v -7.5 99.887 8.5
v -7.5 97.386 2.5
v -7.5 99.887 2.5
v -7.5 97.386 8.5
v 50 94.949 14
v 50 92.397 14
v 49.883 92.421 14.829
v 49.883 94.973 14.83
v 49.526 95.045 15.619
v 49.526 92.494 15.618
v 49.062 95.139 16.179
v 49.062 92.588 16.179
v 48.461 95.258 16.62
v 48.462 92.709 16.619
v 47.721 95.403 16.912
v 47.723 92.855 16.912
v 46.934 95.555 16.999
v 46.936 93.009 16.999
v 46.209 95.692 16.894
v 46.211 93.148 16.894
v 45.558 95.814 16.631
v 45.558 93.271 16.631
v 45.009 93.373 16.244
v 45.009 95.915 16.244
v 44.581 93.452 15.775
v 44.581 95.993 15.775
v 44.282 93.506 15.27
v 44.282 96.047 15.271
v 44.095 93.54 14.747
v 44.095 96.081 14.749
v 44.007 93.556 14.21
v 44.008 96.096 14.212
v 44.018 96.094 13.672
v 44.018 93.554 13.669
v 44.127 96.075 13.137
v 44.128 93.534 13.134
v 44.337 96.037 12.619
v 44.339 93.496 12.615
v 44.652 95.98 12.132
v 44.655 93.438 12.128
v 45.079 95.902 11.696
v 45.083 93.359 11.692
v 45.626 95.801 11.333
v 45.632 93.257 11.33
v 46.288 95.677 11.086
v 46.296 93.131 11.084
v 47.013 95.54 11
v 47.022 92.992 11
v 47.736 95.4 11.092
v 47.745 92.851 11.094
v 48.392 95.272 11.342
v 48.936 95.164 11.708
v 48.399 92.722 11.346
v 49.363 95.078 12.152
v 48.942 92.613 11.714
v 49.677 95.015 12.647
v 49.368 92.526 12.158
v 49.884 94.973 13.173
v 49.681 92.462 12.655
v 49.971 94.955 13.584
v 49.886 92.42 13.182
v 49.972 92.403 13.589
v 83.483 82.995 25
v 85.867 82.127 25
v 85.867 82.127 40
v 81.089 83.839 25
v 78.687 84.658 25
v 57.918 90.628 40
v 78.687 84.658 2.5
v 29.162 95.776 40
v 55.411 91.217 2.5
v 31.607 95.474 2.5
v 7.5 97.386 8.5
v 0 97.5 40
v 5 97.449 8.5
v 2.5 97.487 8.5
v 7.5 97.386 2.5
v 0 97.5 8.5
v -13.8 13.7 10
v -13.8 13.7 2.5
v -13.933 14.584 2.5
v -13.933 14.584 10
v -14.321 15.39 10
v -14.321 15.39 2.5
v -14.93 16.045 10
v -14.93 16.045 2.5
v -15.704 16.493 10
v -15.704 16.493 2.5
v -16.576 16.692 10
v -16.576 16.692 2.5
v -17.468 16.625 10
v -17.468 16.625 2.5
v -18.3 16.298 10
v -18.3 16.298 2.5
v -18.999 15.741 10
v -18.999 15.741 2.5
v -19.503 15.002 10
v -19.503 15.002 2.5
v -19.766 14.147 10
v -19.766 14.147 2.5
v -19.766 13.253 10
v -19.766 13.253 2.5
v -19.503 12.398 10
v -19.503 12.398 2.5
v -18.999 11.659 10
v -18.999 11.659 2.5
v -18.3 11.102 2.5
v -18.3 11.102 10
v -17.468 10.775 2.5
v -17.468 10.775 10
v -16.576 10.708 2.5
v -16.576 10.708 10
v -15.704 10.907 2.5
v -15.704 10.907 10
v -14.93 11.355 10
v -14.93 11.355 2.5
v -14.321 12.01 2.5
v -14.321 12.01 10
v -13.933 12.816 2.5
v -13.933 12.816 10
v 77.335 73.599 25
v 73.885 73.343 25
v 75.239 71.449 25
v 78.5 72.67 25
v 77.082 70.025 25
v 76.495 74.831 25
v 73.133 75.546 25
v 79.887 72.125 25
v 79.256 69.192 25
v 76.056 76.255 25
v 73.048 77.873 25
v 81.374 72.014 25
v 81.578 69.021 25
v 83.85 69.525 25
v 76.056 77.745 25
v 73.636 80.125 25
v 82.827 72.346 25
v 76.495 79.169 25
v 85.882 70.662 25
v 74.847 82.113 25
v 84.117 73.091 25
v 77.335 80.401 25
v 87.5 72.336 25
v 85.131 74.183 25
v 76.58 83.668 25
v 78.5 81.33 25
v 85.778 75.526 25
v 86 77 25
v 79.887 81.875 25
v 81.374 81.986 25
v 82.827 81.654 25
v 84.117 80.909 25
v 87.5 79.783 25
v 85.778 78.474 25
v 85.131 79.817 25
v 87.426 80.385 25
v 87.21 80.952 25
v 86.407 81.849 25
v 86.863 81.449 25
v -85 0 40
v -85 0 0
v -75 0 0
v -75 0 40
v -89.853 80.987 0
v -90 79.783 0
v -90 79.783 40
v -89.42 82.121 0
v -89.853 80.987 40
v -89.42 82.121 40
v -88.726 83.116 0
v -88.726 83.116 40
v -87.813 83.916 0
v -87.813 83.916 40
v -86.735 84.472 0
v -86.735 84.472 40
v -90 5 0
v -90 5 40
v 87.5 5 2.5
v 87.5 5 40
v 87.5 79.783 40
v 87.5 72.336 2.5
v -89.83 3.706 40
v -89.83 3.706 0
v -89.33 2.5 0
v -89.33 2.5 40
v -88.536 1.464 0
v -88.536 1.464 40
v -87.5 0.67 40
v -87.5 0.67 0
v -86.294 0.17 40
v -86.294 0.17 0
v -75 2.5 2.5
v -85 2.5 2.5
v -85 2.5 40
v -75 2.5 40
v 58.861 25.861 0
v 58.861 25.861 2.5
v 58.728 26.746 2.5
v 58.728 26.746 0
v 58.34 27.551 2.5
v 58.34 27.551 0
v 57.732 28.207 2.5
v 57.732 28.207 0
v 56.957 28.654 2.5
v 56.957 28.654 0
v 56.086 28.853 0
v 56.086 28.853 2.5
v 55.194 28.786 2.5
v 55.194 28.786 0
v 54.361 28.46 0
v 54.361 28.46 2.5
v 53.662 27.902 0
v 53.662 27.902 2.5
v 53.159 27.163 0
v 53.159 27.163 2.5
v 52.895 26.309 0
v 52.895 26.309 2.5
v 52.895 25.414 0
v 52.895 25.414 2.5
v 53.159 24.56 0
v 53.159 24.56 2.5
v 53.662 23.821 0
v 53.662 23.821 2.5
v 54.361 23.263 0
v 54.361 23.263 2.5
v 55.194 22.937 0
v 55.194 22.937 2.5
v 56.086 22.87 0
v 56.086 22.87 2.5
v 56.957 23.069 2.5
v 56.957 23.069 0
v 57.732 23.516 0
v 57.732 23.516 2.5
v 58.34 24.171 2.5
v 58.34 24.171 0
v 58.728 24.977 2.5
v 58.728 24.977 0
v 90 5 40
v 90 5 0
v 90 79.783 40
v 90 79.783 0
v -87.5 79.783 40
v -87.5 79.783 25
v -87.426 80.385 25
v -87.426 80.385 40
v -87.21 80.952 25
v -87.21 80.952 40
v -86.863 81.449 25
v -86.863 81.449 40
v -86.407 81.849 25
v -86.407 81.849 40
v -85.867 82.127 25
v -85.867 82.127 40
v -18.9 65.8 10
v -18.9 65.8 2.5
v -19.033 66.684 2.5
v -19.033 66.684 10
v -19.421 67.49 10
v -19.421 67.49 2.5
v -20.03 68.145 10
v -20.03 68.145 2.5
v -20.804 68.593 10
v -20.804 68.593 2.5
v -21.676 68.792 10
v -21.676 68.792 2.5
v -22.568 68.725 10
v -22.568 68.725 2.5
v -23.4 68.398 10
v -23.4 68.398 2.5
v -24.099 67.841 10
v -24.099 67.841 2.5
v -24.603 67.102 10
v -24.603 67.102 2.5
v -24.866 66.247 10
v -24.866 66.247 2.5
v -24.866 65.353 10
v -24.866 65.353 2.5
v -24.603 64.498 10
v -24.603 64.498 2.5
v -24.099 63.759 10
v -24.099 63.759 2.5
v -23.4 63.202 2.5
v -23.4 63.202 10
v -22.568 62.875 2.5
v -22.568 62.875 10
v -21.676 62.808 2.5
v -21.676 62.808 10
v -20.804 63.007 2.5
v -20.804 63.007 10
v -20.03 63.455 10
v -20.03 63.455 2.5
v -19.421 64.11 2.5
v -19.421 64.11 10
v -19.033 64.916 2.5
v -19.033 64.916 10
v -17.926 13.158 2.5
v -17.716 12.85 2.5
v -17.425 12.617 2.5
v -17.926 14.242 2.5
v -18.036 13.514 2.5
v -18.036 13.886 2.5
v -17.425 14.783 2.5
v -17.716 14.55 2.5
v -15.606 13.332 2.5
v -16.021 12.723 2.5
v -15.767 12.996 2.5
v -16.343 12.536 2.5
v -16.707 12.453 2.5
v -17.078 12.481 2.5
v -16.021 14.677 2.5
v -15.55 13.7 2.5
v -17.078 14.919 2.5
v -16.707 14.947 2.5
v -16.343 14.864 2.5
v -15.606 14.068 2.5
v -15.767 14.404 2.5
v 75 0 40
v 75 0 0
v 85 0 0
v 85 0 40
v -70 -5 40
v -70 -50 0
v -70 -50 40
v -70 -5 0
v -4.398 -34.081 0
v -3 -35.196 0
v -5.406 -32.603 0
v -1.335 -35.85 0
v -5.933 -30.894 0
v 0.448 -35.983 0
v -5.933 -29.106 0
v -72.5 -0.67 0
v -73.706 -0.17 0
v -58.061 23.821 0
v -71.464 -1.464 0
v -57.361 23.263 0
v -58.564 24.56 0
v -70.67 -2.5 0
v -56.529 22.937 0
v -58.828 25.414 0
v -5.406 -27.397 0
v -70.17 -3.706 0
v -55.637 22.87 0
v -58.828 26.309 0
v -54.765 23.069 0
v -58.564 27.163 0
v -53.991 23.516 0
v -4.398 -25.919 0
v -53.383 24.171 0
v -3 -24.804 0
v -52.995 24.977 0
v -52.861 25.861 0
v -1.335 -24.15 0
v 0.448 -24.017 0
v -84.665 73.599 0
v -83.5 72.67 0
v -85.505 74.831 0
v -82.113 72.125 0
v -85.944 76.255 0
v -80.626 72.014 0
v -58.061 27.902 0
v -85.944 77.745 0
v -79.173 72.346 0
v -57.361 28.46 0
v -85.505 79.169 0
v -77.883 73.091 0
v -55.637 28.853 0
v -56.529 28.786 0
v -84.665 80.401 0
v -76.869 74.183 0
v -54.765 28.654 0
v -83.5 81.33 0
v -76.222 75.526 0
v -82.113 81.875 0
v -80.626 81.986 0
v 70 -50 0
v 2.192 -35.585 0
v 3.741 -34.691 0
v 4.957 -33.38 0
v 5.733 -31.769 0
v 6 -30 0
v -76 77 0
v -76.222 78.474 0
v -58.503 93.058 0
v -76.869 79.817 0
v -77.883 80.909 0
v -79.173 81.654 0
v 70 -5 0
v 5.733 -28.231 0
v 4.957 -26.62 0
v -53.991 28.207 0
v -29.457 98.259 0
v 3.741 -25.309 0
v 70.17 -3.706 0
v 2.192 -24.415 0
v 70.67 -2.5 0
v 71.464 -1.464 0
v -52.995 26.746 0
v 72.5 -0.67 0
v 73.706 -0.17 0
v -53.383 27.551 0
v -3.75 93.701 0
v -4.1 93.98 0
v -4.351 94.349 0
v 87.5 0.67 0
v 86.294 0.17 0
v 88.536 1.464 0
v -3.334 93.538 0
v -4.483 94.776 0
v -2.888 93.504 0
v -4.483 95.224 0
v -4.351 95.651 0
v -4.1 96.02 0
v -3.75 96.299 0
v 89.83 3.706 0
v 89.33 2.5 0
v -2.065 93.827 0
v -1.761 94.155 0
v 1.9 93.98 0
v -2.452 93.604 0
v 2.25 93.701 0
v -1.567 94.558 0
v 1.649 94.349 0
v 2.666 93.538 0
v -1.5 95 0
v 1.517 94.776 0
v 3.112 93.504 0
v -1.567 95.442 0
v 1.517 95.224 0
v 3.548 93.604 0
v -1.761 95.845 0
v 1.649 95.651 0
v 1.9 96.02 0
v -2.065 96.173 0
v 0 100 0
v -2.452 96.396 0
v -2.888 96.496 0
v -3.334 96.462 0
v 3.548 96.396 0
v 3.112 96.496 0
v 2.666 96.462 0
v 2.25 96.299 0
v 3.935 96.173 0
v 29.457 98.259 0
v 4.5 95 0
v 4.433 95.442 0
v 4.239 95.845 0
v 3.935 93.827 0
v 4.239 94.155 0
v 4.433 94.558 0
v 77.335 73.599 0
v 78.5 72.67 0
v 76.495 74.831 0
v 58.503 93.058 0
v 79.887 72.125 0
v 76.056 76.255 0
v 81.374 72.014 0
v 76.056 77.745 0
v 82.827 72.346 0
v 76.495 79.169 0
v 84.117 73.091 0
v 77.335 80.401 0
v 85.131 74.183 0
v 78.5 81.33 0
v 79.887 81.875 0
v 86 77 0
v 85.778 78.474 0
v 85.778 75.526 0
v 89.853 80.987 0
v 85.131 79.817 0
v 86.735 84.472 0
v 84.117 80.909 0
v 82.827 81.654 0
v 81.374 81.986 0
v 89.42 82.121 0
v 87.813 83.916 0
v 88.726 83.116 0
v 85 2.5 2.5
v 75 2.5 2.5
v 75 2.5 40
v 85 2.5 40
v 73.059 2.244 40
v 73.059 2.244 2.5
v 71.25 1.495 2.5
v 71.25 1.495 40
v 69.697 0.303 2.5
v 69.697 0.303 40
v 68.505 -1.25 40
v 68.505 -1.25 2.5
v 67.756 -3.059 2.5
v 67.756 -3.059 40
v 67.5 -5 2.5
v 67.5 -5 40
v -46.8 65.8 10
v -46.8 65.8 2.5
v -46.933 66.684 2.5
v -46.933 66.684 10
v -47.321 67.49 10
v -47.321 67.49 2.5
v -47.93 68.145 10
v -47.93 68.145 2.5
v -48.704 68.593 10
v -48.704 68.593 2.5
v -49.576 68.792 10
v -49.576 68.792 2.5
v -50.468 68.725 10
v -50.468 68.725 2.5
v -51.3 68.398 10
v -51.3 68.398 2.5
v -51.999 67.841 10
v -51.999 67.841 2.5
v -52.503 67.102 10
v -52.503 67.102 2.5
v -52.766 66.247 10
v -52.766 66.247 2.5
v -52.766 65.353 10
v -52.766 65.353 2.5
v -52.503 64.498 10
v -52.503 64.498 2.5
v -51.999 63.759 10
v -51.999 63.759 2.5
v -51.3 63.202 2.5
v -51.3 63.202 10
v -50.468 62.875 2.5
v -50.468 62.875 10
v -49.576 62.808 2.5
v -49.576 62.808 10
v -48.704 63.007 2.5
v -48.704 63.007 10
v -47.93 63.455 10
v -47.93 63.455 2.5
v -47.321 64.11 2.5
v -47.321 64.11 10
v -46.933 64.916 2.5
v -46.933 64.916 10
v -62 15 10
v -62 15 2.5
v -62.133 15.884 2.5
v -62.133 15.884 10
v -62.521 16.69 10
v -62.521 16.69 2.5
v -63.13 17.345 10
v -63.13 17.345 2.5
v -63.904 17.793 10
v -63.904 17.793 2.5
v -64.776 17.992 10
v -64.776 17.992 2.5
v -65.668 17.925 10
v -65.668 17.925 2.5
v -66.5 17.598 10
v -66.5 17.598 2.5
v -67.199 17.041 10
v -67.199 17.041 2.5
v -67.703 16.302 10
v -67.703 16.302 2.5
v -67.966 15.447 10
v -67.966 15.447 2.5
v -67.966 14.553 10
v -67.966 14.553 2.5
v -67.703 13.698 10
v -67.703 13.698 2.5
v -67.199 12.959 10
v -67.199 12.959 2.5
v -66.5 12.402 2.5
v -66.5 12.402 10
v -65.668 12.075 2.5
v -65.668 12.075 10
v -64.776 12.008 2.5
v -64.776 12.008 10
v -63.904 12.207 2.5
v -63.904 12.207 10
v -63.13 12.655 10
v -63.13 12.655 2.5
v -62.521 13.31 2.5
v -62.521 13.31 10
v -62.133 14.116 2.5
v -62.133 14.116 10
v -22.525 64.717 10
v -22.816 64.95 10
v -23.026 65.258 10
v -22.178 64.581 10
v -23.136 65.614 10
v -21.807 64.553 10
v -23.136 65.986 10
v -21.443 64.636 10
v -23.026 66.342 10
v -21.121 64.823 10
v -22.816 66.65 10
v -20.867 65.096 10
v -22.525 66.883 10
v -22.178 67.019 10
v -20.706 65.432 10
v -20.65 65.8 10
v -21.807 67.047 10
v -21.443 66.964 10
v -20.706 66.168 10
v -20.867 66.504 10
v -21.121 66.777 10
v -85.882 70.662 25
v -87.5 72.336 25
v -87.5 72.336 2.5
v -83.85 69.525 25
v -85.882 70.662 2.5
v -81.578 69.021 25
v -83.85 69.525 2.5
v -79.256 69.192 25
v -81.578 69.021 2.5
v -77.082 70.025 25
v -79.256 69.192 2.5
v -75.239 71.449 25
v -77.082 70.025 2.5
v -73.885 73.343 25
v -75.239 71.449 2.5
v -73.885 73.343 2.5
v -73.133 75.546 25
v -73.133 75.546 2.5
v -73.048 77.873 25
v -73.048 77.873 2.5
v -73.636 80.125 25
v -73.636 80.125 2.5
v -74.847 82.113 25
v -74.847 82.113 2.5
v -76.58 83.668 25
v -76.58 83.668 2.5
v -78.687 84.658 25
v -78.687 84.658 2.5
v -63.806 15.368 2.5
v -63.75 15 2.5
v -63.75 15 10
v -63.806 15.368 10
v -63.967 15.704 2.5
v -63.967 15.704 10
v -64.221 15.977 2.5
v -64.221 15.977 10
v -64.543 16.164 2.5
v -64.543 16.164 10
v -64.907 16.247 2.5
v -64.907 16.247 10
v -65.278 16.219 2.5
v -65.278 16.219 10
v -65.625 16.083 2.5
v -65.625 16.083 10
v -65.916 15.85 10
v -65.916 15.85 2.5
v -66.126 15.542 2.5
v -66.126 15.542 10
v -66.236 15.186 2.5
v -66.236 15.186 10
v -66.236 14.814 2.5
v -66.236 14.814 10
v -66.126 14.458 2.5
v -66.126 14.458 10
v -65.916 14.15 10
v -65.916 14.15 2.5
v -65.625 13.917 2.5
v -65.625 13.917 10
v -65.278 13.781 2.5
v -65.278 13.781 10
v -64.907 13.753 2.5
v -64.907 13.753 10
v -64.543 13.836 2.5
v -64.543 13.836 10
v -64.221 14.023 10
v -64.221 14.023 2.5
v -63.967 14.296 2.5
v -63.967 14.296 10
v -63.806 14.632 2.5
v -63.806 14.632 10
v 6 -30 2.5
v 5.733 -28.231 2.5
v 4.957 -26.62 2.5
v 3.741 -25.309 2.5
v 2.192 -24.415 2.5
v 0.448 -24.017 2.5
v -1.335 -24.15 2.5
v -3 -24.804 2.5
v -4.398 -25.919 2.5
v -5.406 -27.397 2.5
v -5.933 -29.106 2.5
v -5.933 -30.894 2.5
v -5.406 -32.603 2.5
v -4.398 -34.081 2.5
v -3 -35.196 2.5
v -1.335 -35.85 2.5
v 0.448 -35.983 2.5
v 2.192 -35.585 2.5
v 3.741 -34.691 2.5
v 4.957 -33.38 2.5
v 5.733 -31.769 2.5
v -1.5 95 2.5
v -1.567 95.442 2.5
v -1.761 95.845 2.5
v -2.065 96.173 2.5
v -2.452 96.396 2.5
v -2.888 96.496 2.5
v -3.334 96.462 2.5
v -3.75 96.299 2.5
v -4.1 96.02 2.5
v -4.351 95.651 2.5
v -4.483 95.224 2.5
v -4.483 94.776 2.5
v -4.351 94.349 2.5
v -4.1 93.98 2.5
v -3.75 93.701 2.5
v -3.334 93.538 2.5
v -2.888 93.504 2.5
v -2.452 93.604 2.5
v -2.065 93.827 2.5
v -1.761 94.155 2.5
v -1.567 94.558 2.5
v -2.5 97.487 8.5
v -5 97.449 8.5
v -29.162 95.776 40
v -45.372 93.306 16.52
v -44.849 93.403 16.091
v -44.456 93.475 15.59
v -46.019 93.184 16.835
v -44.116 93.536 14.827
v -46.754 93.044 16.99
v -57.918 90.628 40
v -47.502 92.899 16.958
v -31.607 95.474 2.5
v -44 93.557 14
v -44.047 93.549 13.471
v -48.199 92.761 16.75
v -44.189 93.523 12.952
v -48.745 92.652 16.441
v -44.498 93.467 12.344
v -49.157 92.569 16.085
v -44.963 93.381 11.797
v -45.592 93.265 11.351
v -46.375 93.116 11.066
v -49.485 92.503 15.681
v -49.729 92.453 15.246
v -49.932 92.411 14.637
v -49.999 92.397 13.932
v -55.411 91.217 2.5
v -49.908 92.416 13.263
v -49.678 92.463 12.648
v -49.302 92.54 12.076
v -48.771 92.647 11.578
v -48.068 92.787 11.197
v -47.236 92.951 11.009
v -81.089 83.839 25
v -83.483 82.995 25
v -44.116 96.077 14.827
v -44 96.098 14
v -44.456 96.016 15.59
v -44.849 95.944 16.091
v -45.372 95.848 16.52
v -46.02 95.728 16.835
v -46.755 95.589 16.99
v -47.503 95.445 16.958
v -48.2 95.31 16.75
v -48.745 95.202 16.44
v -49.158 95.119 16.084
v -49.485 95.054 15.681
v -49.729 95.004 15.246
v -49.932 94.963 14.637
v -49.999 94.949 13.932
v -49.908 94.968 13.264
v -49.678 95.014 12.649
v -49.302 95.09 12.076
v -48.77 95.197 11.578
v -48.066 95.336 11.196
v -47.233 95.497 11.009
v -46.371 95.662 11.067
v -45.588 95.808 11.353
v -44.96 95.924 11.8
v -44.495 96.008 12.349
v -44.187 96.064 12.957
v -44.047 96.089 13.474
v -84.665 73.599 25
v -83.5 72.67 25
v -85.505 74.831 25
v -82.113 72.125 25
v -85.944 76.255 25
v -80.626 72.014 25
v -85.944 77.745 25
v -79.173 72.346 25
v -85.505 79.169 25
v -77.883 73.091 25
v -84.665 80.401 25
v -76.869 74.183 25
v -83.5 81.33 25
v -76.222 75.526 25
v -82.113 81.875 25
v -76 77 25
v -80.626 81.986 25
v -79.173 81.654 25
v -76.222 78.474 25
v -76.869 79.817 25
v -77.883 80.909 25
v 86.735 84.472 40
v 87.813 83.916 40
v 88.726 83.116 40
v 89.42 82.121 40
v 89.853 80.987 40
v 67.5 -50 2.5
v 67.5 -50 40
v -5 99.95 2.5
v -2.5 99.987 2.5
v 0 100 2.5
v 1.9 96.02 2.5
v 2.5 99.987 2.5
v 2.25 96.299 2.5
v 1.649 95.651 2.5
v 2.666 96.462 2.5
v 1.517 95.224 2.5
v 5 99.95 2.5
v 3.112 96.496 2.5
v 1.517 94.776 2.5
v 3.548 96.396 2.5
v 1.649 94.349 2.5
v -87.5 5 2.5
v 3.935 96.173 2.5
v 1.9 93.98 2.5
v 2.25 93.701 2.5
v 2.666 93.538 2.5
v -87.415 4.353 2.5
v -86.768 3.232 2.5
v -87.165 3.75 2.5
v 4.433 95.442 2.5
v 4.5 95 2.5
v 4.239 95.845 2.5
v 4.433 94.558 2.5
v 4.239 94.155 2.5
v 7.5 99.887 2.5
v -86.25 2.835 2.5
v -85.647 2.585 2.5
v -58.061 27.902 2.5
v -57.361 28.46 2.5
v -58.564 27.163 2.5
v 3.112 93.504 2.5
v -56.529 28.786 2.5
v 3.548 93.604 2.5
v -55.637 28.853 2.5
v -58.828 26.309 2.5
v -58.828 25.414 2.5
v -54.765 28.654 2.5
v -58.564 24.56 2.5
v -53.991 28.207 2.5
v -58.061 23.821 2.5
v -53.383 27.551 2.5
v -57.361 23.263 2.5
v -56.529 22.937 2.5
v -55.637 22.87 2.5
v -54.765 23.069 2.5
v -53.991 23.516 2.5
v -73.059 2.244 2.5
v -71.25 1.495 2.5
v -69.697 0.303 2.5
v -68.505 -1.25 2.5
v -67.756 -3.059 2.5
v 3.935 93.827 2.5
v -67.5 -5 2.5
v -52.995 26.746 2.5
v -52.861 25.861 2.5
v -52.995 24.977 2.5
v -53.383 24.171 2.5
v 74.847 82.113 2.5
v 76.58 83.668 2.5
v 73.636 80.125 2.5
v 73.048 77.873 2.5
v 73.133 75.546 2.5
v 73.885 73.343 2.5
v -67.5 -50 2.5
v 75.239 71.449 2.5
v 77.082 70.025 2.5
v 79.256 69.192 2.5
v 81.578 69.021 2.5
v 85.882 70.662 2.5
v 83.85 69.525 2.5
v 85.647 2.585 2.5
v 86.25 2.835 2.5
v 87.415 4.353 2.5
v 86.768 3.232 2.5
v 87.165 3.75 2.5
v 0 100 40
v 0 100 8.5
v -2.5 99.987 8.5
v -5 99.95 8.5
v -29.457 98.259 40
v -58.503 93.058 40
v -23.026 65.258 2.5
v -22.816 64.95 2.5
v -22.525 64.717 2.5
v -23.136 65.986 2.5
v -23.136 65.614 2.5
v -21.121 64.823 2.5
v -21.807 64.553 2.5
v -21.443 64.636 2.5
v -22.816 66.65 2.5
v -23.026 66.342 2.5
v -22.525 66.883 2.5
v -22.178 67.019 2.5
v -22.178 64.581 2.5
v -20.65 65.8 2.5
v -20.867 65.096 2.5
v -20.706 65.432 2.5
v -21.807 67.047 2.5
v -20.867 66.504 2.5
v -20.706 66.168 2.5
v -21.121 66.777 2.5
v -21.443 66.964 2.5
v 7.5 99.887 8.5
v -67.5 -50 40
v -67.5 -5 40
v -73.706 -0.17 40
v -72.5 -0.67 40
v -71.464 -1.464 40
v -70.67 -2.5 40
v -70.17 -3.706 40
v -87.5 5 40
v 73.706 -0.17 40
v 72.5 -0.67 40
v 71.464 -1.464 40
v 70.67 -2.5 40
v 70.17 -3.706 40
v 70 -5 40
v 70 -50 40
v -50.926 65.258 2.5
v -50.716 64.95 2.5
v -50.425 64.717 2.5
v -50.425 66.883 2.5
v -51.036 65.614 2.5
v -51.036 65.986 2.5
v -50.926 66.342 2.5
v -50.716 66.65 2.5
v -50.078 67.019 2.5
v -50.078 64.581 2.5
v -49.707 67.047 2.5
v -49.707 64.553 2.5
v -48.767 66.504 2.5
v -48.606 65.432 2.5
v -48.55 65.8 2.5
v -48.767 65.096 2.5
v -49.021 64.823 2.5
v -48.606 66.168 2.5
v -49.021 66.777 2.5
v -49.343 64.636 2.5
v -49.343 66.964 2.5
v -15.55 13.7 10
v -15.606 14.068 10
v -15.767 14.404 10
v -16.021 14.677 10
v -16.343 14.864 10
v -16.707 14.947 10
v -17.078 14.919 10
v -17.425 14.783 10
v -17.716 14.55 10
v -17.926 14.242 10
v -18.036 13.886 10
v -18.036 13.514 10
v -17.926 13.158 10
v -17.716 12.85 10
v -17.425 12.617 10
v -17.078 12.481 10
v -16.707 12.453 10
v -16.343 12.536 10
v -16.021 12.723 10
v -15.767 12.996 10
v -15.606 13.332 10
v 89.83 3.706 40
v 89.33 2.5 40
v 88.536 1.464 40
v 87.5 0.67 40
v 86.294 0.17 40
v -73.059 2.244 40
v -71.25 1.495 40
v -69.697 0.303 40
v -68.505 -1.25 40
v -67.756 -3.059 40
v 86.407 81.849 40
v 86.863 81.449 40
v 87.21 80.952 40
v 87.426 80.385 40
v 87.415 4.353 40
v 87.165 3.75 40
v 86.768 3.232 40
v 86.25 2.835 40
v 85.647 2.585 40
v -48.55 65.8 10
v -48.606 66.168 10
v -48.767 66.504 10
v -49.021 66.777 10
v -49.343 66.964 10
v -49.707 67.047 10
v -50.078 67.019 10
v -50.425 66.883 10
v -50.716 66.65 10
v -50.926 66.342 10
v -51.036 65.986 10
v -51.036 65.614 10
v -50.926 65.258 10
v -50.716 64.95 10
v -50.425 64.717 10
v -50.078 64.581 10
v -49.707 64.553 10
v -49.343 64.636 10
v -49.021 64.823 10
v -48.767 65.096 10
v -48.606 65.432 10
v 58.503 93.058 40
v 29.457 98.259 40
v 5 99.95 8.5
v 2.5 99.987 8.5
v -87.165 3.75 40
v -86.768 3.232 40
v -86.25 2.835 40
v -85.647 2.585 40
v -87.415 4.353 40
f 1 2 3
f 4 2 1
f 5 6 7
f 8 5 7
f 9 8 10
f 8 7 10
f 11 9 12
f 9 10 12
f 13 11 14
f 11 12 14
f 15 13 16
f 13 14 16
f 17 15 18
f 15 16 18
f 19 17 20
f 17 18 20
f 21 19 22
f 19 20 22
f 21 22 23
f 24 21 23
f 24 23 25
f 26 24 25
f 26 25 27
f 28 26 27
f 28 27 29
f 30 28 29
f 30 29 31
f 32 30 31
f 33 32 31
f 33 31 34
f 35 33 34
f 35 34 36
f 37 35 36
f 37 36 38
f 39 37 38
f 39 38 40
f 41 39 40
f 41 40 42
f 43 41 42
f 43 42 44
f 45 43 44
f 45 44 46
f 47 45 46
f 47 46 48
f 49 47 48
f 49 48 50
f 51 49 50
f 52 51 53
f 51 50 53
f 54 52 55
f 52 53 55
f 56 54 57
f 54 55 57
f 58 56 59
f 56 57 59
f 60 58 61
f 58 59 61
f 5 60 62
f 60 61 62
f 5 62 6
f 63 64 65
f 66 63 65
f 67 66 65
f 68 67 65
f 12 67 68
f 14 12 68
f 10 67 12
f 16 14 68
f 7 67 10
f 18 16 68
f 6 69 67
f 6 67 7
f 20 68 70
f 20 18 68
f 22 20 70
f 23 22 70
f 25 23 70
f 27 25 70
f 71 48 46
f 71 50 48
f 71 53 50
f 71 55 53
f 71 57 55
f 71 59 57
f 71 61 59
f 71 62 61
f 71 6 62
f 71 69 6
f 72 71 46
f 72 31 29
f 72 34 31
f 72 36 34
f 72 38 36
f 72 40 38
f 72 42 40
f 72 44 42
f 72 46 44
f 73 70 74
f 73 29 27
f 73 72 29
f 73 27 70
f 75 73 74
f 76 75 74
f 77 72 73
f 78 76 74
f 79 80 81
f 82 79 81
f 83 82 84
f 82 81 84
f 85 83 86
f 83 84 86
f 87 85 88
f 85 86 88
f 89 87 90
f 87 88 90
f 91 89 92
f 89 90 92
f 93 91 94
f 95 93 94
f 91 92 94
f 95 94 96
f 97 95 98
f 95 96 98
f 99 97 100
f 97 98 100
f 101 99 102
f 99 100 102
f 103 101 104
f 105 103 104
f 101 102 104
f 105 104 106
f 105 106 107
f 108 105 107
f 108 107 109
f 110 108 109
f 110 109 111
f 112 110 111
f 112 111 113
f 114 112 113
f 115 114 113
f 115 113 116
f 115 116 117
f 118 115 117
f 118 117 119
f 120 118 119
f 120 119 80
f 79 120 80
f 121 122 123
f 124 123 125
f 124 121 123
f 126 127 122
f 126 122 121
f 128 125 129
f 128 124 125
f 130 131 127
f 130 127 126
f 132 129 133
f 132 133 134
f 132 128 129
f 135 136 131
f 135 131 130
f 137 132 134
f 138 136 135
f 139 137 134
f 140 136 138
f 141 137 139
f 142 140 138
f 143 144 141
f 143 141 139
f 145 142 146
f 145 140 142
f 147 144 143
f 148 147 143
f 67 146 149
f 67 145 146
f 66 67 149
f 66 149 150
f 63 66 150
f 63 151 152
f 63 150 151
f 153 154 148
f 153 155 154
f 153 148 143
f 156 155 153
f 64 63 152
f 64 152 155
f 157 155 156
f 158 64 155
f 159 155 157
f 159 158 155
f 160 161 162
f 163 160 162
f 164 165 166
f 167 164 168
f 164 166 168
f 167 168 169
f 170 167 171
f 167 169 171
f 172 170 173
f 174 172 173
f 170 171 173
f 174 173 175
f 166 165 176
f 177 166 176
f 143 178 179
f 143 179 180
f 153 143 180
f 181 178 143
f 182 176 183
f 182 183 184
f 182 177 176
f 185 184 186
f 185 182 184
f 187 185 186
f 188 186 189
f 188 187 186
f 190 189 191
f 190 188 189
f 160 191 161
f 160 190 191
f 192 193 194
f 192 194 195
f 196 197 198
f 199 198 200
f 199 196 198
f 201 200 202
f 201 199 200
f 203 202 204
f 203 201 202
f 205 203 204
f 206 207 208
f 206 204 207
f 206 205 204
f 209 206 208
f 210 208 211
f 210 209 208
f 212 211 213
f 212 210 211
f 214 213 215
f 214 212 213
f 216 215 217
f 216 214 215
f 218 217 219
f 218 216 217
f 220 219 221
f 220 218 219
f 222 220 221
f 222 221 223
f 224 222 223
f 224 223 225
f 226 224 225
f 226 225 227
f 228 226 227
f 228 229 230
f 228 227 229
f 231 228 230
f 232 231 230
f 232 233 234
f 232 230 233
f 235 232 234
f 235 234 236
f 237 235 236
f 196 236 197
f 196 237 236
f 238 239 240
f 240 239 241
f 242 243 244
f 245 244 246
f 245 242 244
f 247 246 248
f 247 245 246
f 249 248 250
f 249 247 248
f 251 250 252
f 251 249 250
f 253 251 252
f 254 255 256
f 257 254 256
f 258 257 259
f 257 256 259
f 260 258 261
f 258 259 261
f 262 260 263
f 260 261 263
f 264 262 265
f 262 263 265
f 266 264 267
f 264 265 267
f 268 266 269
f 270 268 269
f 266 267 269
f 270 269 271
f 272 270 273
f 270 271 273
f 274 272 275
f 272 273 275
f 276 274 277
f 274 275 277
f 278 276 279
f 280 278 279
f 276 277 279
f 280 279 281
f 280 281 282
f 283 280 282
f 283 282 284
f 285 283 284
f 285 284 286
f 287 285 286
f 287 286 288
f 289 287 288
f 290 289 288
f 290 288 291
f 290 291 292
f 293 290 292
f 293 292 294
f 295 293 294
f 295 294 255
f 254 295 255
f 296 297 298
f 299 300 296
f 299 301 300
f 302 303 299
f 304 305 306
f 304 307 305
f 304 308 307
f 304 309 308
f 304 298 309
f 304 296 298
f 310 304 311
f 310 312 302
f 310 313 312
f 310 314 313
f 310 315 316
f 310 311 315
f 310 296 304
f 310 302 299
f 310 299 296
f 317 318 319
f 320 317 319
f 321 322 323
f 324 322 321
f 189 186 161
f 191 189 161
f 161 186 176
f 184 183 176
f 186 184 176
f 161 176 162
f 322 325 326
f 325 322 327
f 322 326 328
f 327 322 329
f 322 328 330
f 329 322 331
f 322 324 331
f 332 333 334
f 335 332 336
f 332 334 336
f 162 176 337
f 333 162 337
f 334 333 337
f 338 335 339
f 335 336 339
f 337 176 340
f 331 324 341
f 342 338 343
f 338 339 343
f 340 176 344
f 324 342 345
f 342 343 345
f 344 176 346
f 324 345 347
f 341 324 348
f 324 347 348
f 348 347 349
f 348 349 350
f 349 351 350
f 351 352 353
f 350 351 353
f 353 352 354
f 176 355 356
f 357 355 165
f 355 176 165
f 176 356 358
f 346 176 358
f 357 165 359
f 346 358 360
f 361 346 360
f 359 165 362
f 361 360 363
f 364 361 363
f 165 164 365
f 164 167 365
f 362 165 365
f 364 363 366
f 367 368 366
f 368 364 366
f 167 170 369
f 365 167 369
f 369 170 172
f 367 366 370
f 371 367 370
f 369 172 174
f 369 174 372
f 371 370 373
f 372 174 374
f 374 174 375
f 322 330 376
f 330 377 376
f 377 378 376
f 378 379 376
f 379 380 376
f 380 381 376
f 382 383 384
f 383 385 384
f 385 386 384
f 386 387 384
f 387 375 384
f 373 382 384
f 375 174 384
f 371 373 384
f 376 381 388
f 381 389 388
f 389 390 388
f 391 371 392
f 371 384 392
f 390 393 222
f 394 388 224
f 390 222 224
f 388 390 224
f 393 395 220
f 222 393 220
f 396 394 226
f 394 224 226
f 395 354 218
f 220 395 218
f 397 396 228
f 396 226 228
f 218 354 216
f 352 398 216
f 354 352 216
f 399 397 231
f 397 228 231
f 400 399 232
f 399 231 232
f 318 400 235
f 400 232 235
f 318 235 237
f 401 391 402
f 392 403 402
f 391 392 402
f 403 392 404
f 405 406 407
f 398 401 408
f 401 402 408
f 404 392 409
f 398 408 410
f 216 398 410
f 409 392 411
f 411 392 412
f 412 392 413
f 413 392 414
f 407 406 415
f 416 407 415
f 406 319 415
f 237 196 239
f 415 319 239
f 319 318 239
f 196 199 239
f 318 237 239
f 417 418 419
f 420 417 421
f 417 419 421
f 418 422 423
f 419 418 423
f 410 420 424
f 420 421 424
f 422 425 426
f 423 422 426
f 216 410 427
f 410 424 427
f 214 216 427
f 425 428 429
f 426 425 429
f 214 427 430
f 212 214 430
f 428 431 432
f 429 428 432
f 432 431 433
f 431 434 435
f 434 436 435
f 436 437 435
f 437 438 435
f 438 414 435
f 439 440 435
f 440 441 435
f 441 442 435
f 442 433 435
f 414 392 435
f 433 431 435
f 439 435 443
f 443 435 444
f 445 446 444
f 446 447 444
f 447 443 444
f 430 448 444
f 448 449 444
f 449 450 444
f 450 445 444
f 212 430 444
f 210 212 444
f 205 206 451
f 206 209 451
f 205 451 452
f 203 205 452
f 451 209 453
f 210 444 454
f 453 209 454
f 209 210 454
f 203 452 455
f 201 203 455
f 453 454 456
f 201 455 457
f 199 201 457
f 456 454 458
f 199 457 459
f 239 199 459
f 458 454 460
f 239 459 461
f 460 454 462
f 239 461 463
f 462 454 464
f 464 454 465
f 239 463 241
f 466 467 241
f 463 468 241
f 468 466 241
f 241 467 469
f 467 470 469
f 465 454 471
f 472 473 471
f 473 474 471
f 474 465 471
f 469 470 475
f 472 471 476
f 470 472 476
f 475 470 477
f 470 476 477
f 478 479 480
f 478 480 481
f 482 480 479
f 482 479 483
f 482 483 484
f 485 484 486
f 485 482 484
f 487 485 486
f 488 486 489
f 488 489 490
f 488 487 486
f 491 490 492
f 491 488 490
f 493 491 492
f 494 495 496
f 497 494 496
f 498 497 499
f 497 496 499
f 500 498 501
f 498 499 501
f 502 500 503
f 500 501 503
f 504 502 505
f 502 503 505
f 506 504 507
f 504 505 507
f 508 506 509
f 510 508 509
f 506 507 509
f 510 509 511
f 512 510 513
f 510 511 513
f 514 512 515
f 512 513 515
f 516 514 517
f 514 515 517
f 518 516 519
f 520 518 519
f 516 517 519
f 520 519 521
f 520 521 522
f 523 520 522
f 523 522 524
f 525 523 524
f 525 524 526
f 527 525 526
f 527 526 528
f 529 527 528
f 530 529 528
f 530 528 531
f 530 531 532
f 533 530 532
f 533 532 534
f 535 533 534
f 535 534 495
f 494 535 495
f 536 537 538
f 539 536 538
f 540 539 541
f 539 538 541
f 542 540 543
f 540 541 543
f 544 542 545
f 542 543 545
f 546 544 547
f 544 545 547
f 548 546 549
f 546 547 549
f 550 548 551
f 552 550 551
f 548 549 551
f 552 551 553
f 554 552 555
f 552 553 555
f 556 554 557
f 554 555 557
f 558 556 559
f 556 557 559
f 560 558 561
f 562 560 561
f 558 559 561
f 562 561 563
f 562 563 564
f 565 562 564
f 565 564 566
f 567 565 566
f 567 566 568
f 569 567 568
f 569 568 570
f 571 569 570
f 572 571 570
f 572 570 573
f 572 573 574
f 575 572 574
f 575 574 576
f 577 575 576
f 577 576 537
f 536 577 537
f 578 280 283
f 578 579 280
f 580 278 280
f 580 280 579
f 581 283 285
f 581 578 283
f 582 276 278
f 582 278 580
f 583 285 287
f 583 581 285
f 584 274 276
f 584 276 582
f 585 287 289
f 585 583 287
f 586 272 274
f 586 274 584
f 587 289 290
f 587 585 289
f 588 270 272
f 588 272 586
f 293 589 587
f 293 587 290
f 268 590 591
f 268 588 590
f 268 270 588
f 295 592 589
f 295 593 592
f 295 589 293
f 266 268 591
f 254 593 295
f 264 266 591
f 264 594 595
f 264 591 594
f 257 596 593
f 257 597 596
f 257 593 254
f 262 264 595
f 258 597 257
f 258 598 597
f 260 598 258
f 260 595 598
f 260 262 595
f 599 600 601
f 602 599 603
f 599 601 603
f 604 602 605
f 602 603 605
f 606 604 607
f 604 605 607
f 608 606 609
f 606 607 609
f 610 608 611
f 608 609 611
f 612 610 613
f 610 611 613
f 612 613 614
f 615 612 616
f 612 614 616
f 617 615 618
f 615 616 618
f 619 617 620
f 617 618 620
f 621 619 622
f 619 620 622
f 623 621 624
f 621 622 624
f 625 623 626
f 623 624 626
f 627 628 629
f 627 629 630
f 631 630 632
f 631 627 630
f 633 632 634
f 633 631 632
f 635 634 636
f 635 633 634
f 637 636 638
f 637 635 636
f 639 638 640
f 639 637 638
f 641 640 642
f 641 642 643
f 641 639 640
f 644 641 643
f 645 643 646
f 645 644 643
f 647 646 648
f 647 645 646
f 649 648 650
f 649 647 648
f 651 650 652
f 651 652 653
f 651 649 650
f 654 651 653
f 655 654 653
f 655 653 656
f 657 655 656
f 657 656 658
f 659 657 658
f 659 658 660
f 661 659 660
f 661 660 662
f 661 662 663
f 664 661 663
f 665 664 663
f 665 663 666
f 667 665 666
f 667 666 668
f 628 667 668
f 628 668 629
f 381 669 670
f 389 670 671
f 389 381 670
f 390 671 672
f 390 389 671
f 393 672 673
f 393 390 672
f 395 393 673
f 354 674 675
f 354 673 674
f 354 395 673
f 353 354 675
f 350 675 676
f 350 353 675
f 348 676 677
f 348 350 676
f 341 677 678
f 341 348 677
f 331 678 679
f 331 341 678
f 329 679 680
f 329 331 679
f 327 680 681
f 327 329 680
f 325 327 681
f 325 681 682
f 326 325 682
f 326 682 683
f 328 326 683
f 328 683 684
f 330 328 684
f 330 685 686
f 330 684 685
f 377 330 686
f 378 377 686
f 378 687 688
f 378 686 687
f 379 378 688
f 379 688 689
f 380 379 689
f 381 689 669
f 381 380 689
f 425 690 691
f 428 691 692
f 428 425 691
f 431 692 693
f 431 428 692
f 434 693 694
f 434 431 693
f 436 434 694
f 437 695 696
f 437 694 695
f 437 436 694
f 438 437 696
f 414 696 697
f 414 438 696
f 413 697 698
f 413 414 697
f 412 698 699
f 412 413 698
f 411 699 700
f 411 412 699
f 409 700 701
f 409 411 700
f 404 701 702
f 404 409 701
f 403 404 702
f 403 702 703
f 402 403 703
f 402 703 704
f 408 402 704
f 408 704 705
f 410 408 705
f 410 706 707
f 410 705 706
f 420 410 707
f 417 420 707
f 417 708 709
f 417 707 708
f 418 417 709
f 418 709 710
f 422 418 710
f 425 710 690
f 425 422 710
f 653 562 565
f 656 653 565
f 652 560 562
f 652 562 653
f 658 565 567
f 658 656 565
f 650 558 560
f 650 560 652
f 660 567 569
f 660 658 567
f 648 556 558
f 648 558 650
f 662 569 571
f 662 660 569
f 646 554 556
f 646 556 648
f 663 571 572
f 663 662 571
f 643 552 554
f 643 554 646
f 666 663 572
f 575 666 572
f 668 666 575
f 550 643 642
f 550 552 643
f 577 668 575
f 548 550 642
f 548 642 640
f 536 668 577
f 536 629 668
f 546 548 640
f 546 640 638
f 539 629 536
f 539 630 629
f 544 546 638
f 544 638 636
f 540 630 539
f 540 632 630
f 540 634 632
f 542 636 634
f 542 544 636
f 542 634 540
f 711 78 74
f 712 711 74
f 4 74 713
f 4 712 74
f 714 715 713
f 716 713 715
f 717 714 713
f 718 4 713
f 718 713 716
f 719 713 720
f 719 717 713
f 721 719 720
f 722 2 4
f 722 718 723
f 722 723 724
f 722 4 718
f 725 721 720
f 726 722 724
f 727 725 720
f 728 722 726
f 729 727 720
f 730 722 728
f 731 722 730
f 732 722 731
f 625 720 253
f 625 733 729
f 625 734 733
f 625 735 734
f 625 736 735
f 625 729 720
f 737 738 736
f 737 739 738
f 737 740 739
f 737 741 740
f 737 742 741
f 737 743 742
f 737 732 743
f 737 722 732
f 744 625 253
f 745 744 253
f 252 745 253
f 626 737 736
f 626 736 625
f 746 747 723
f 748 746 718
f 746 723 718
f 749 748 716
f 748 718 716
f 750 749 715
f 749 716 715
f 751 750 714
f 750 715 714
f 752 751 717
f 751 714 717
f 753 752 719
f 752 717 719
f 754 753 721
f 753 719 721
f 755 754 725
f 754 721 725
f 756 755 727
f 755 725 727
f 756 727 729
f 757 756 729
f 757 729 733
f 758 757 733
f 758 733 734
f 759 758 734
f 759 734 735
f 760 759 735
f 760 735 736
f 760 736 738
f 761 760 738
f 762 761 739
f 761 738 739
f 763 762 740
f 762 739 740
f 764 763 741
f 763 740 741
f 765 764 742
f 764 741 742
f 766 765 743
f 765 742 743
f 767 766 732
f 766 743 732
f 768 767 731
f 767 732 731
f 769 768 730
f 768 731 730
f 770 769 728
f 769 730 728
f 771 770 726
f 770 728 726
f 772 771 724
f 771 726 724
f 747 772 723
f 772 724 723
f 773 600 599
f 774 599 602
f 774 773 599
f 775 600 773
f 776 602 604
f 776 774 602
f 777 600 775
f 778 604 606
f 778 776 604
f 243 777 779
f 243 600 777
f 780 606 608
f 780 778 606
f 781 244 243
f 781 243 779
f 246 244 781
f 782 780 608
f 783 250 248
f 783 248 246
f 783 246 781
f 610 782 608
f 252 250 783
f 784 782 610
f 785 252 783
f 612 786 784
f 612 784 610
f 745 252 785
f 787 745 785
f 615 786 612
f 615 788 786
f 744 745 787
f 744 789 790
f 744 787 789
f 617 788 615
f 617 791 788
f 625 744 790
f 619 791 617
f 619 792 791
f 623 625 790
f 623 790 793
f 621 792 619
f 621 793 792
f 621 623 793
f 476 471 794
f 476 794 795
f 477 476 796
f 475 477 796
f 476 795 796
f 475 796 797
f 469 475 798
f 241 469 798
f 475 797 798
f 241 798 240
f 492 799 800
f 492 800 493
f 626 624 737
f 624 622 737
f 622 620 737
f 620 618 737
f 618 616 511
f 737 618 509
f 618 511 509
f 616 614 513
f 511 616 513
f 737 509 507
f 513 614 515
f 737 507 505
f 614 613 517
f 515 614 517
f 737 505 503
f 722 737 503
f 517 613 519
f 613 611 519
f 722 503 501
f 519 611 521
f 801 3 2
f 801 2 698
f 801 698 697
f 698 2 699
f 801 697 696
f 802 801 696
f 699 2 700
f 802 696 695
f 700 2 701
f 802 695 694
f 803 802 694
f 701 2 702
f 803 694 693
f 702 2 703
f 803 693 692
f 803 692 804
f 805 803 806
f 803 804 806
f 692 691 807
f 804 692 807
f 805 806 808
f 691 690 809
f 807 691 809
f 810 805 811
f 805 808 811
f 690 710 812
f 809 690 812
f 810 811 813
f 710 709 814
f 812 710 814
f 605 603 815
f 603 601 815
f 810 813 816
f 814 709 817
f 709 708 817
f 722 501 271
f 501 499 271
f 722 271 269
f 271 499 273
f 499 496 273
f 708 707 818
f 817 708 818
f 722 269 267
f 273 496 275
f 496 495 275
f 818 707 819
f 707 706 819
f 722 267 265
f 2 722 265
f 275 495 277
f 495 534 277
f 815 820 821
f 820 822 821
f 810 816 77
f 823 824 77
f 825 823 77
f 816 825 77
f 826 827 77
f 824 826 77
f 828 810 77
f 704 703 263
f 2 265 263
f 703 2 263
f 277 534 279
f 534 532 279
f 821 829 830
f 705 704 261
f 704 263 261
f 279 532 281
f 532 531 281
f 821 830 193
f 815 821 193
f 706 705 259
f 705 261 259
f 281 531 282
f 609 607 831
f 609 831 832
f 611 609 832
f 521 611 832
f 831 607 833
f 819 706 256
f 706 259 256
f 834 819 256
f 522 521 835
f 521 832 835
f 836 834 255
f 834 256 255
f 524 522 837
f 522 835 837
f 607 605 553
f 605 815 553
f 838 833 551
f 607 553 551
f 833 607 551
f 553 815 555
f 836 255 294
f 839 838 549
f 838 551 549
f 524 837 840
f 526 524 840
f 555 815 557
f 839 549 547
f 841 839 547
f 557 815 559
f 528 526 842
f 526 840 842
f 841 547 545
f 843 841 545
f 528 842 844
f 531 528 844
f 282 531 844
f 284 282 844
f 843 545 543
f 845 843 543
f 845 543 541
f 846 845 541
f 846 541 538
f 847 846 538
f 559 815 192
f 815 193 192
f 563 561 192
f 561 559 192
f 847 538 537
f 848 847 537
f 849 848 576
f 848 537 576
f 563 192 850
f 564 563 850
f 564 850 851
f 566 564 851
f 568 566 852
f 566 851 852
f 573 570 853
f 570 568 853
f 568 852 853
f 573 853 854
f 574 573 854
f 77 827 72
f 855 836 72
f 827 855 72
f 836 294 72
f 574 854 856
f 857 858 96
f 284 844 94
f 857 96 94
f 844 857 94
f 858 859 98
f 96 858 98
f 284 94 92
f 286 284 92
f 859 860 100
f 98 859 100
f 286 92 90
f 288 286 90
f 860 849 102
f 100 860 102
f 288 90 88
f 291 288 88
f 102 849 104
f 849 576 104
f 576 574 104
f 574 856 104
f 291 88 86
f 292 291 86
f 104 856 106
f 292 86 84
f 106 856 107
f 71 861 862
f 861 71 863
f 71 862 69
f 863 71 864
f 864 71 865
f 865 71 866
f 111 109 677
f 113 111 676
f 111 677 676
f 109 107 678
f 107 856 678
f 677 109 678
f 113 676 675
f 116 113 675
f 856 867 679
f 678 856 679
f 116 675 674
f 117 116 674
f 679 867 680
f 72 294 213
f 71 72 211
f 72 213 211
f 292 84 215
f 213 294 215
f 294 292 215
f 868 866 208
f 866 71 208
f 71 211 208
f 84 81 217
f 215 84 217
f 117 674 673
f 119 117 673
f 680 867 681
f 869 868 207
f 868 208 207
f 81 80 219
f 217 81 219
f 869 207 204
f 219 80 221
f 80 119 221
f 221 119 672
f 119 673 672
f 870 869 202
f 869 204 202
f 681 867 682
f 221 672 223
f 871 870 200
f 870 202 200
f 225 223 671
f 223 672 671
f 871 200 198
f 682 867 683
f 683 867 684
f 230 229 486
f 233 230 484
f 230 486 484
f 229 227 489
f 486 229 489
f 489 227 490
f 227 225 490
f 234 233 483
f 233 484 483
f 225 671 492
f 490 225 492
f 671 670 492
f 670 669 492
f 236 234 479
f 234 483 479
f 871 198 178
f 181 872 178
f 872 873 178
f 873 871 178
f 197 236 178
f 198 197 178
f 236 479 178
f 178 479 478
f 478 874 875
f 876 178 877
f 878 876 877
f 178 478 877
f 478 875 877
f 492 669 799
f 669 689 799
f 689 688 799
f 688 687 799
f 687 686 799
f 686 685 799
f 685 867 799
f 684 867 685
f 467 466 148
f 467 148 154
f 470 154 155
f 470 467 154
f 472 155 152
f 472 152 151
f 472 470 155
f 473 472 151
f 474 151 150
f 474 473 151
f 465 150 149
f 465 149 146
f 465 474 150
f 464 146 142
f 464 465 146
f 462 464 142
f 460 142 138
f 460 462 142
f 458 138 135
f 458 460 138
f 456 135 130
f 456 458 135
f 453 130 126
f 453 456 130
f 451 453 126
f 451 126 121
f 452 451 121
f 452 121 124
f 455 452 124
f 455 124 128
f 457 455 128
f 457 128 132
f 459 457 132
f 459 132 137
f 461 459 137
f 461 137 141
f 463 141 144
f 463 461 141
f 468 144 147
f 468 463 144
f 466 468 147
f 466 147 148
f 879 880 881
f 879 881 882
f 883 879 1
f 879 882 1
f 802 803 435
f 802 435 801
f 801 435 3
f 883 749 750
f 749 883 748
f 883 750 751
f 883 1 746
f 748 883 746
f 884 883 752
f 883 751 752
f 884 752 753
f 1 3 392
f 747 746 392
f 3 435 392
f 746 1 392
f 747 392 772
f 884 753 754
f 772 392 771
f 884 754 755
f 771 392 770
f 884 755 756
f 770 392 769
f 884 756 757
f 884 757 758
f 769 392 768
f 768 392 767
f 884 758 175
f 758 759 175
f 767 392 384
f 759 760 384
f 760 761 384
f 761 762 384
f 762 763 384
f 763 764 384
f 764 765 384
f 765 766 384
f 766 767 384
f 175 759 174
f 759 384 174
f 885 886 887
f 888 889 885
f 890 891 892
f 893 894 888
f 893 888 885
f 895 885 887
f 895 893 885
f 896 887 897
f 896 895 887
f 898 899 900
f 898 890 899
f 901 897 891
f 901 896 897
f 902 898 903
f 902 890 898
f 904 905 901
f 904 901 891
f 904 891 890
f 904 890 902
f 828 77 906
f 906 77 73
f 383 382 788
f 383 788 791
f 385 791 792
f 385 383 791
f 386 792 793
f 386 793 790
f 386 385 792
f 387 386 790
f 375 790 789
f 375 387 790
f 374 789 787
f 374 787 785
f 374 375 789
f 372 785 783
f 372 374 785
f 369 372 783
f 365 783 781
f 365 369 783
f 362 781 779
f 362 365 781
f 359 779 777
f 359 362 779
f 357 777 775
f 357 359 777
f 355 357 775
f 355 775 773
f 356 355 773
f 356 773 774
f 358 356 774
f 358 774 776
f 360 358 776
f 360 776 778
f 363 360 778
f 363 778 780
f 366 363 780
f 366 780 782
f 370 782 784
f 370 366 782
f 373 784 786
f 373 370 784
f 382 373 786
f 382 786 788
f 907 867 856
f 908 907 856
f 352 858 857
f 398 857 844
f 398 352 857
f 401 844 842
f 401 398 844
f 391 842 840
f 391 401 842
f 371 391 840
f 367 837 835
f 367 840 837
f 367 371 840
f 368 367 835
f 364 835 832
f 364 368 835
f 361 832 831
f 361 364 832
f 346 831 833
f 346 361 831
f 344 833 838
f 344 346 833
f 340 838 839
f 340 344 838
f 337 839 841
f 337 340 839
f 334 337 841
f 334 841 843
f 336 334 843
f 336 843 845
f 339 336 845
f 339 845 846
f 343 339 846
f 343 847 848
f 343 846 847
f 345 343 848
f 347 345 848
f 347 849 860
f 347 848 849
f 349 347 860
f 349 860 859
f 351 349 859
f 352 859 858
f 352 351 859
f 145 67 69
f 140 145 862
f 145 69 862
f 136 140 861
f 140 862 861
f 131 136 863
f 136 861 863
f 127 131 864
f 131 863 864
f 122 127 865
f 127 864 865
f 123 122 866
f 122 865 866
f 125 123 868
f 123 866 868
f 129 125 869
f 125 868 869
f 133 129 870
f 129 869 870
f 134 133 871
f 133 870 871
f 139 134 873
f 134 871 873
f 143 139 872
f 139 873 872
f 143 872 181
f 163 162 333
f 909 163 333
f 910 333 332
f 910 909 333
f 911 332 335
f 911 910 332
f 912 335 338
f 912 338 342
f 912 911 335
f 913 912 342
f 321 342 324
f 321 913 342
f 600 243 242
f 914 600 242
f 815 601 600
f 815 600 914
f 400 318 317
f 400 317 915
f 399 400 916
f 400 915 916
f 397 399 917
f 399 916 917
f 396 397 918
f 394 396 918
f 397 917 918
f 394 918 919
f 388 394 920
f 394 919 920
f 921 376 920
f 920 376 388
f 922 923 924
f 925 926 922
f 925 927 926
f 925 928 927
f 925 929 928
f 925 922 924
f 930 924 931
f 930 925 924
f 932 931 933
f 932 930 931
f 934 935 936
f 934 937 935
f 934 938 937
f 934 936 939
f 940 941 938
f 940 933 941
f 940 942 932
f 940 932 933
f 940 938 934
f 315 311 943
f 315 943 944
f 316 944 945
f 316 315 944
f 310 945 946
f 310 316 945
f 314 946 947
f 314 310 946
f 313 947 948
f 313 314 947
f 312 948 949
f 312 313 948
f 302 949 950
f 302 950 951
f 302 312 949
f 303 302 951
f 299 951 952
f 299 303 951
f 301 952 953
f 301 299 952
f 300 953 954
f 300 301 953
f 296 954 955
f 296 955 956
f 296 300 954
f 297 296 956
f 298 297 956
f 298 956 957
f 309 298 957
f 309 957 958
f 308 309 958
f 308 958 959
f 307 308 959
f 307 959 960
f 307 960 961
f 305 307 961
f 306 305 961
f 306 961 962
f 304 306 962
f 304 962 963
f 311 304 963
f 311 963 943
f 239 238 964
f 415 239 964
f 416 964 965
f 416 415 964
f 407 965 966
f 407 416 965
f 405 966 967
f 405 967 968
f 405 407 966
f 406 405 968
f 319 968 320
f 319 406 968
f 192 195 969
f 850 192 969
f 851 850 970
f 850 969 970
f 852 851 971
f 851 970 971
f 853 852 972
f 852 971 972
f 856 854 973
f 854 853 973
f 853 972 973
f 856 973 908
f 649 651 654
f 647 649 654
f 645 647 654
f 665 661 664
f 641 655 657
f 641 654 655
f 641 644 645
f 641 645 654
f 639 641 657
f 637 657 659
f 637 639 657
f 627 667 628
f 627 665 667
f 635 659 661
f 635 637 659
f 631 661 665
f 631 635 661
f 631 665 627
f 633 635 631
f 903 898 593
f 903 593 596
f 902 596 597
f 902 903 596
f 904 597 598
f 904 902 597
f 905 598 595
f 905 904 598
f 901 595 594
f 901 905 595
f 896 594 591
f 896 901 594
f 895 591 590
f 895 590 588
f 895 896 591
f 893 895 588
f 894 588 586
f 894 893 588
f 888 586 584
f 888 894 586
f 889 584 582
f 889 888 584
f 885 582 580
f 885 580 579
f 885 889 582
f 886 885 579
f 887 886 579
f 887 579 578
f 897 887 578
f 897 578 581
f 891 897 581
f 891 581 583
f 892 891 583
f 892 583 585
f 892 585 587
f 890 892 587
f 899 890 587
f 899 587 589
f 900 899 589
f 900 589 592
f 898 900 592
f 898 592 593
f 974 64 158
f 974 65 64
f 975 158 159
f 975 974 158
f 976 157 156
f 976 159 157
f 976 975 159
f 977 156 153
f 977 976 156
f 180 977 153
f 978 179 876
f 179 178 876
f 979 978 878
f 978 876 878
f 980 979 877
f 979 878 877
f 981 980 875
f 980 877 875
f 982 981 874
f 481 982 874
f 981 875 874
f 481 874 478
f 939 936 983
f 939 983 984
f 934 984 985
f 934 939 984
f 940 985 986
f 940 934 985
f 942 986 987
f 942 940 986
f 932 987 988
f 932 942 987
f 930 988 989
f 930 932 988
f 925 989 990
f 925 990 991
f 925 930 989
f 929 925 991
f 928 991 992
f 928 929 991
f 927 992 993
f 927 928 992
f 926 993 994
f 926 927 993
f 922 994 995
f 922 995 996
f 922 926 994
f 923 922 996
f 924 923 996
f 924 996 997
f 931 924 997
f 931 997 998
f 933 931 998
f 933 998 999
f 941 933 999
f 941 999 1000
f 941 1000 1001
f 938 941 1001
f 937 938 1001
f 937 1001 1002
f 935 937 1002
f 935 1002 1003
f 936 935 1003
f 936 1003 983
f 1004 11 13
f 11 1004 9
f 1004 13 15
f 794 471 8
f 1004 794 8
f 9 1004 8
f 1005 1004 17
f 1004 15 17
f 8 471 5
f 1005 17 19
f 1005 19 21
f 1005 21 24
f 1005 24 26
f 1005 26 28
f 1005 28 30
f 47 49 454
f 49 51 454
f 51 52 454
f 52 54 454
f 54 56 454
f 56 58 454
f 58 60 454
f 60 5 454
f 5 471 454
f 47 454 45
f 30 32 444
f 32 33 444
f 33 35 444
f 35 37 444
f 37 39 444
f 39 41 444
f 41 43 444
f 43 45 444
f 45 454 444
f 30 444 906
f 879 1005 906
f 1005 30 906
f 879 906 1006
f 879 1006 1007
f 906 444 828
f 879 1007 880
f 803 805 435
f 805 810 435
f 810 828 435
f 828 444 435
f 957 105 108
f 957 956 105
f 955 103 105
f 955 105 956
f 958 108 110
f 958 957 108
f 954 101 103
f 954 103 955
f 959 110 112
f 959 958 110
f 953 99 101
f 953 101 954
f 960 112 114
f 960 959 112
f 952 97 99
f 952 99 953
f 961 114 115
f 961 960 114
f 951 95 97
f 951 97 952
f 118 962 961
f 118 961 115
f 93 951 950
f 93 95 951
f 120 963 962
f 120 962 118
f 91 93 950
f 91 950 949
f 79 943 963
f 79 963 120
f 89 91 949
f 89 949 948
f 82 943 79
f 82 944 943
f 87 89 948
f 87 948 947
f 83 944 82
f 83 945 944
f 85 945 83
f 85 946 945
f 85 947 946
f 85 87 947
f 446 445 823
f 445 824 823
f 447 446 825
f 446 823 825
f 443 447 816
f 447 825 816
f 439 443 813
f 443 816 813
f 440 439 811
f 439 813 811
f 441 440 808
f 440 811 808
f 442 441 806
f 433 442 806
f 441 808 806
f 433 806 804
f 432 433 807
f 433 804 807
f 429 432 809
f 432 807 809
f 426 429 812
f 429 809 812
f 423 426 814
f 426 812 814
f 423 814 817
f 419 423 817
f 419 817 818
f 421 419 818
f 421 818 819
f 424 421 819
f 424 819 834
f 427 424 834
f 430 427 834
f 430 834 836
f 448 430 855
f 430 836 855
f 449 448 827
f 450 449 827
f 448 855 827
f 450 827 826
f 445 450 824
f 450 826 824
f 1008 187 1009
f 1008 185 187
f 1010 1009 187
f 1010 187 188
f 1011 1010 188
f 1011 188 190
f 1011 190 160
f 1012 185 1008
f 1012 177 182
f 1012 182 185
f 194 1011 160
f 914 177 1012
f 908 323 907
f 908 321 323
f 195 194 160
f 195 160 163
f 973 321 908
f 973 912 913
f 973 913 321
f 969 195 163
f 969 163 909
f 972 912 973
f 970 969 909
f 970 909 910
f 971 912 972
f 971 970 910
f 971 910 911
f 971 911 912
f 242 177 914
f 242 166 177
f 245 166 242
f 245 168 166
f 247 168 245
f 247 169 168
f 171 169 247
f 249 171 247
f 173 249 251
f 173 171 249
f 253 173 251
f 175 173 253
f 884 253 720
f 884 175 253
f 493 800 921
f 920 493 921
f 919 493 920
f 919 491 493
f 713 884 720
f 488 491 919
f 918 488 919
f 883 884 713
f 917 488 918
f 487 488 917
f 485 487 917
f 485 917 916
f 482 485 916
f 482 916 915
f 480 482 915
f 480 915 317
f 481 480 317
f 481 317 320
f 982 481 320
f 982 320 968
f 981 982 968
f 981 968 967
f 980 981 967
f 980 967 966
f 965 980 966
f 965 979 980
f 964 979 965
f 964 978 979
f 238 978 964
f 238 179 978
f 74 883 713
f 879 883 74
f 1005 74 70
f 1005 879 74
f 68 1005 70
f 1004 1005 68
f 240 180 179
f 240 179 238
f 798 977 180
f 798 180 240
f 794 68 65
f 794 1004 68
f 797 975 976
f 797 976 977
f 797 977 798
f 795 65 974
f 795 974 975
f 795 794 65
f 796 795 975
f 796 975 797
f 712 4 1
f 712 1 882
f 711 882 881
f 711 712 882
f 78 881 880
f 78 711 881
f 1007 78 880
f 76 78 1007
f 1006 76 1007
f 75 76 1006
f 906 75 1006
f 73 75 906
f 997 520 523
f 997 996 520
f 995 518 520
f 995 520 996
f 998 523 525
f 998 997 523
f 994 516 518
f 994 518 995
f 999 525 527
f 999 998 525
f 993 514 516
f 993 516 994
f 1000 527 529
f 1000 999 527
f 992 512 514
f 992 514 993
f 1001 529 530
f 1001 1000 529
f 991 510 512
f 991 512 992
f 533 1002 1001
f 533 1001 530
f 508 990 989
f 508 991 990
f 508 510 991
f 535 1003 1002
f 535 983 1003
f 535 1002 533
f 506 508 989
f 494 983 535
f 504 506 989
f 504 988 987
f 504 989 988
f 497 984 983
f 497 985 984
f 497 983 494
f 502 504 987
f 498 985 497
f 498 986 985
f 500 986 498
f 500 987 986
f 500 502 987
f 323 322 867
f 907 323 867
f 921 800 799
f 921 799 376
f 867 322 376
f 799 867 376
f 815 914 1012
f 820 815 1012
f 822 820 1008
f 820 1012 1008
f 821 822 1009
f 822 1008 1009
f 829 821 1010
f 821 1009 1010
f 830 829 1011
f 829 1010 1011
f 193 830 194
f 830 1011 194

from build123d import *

# Parameters (mm, degrees)
F1_DEPTH  = 40
F2_W      = 100
F2_H      = 200
F3_DEPTH  = 100
F4_R      = 5
F5_T      = -2.5
F6_R      = 6
F7_DEPTH  = 25
F8_R      = 3
F9_DEPTH  = 25
F10_R     = 8
F11_DEPTH = 25
F12_R     = 5
F13_DEPTH = 25
F14_R     = 3
F14_R_2   = 1.25
F15_DEPTH = 10
F16_R     = 3
F17_DEPTH = 150
F18_W     = 15
F18_H     = 6
F19_DEPTH = 250
F20_R     = 1.5
F21_DEPTH = 12.5


with BuildPart() as f1:
    # F0 (on Top) → F1 (new body)
    with BuildSketch(Plane.XY):
        with BuildLine():
            Line((-90, 83.2380757938), (-90, -50))
            Line((-90, -50), (90, -50))
            Line((90, -50), (90, 83.2380757938))
            ThreePointArc((90, 83.2380757938), (45.7737973711, 95.7737973711), (0, 100))
            ThreePointArc((0, 100), (-45.7737973711, 95.7737973711), (-90, 83.2380757938))
        make_face()
    extrude(amount=F1_DEPTH)

    # F2 (on Top) → F3 (cut)
    with BuildSketch(Plane.XY):
        with Locations((-120, -100)):
            Rectangle(F2_W, F2_H)
        with Locations((120, -100)):
            Rectangle(F2_W, F2_H)
    extrude(amount=F3_DEPTH, mode=Mode.SUBTRACT)

    # F4
    f4_edges = [f1.edges().sort_by_distance(p)[0] for p in [
        (-90, 83.238076, 20),
        (90, 83.238076, 20),
        (90, 0, 20),
        (70, 0, 20),
        (-90, 0, 20),
        (-70, 0, 20),
    ]]
    fillet(f4_edges, radius=F4_R)

    # F5
    f5_openings = [f1.faces().sort_by_distance(p)[0] for p in [
        (0, 26.262097, 40),
        (0, -50, 20),
    ]]
    offset(amount=F5_T, openings=f5_openings)

    # F6 (on Top) → F7 (cut)
    with BuildSketch(Plane.XY):
        with Locations((0, -30)):
            Circle(F6_R)
    extrude(amount=F7_DEPTH, mode=Mode.SUBTRACT)

    # F8 (on Top) → F9 (cut)
    with BuildSketch(Plane.XY):
        with Locations((-55.8614357137, 25.8614357137)):
            Circle(F8_R)
        with Locations((55.8614357137, 25.8614357137)):
            Circle(F8_R)
    extrude(amount=F9_DEPTH, mode=Mode.SUBTRACT)

    # F10 (on Top) → F11 (join)
    with BuildSketch(Plane.XY):
        with Locations((-81, 77)):
            Circle(F10_R)
        with Locations((81, 77)):
            Circle(F10_R)
    extrude(amount=F11_DEPTH)

    # F12 (on Top) → F13 (cut)
    with BuildSketch(Plane.XY):
        with Locations((-81, 77)):
            Circle(F12_R)
        with Locations((81, 77)):
            Circle(F12_R)
    extrude(amount=F13_DEPTH, mode=Mode.SUBTRACT)

    # F14 (on Top) → F15 (join)
    with BuildSketch(Plane.XY):
        with Locations((-65, 15)):
            Circle(F14_R)
        with Locations((-65, 15)):
            Circle(F14_R_2, mode=Mode.SUBTRACT)
        with Locations((-49.8, 65.8)):
            Circle(F14_R)
        with Locations((-49.8, 65.8)):
            Circle(F14_R_2, mode=Mode.SUBTRACT)
        with Locations((-21.9, 65.8)):
            Circle(F14_R)
        with Locations((-21.9, 65.8)):
            Circle(F14_R_2, mode=Mode.SUBTRACT)
        with Locations((-16.8, 13.7)):
            Circle(F14_R)
        with Locations((-16.8, 13.7)):
            Circle(F14_R_2, mode=Mode.SUBTRACT)
    extrude(amount=F15_DEPTH)

    # F16 (on Front) → F17 (cut, symmetric)
    with BuildSketch(Plane.XZ):
        with Locations((47, 14)):
            Circle(F16_R)
        with Locations((-47, 14)):
            Circle(F16_R)
    extrude(amount=F17_DEPTH, both=True, mode=Mode.SUBTRACT)

    # F18 (on Front) → F19 (cut)
    with BuildSketch(Plane.XZ):
        with Locations((0, 5.5)):
            Rectangle(F18_W, F18_H)
    extrude(amount=-F19_DEPTH, mode=Mode.SUBTRACT)

    # F20 (on Top) → F21 (cut, symmetric)
    with BuildSketch(Plane.XY):
        with Locations((-3, 95)):
            Circle(F20_R)
        with Locations((3, 95)):
            Circle(F20_R)
    extrude(amount=F21_DEPTH, both=True, mode=Mode.SUBTRACT)


solid = f1.part
